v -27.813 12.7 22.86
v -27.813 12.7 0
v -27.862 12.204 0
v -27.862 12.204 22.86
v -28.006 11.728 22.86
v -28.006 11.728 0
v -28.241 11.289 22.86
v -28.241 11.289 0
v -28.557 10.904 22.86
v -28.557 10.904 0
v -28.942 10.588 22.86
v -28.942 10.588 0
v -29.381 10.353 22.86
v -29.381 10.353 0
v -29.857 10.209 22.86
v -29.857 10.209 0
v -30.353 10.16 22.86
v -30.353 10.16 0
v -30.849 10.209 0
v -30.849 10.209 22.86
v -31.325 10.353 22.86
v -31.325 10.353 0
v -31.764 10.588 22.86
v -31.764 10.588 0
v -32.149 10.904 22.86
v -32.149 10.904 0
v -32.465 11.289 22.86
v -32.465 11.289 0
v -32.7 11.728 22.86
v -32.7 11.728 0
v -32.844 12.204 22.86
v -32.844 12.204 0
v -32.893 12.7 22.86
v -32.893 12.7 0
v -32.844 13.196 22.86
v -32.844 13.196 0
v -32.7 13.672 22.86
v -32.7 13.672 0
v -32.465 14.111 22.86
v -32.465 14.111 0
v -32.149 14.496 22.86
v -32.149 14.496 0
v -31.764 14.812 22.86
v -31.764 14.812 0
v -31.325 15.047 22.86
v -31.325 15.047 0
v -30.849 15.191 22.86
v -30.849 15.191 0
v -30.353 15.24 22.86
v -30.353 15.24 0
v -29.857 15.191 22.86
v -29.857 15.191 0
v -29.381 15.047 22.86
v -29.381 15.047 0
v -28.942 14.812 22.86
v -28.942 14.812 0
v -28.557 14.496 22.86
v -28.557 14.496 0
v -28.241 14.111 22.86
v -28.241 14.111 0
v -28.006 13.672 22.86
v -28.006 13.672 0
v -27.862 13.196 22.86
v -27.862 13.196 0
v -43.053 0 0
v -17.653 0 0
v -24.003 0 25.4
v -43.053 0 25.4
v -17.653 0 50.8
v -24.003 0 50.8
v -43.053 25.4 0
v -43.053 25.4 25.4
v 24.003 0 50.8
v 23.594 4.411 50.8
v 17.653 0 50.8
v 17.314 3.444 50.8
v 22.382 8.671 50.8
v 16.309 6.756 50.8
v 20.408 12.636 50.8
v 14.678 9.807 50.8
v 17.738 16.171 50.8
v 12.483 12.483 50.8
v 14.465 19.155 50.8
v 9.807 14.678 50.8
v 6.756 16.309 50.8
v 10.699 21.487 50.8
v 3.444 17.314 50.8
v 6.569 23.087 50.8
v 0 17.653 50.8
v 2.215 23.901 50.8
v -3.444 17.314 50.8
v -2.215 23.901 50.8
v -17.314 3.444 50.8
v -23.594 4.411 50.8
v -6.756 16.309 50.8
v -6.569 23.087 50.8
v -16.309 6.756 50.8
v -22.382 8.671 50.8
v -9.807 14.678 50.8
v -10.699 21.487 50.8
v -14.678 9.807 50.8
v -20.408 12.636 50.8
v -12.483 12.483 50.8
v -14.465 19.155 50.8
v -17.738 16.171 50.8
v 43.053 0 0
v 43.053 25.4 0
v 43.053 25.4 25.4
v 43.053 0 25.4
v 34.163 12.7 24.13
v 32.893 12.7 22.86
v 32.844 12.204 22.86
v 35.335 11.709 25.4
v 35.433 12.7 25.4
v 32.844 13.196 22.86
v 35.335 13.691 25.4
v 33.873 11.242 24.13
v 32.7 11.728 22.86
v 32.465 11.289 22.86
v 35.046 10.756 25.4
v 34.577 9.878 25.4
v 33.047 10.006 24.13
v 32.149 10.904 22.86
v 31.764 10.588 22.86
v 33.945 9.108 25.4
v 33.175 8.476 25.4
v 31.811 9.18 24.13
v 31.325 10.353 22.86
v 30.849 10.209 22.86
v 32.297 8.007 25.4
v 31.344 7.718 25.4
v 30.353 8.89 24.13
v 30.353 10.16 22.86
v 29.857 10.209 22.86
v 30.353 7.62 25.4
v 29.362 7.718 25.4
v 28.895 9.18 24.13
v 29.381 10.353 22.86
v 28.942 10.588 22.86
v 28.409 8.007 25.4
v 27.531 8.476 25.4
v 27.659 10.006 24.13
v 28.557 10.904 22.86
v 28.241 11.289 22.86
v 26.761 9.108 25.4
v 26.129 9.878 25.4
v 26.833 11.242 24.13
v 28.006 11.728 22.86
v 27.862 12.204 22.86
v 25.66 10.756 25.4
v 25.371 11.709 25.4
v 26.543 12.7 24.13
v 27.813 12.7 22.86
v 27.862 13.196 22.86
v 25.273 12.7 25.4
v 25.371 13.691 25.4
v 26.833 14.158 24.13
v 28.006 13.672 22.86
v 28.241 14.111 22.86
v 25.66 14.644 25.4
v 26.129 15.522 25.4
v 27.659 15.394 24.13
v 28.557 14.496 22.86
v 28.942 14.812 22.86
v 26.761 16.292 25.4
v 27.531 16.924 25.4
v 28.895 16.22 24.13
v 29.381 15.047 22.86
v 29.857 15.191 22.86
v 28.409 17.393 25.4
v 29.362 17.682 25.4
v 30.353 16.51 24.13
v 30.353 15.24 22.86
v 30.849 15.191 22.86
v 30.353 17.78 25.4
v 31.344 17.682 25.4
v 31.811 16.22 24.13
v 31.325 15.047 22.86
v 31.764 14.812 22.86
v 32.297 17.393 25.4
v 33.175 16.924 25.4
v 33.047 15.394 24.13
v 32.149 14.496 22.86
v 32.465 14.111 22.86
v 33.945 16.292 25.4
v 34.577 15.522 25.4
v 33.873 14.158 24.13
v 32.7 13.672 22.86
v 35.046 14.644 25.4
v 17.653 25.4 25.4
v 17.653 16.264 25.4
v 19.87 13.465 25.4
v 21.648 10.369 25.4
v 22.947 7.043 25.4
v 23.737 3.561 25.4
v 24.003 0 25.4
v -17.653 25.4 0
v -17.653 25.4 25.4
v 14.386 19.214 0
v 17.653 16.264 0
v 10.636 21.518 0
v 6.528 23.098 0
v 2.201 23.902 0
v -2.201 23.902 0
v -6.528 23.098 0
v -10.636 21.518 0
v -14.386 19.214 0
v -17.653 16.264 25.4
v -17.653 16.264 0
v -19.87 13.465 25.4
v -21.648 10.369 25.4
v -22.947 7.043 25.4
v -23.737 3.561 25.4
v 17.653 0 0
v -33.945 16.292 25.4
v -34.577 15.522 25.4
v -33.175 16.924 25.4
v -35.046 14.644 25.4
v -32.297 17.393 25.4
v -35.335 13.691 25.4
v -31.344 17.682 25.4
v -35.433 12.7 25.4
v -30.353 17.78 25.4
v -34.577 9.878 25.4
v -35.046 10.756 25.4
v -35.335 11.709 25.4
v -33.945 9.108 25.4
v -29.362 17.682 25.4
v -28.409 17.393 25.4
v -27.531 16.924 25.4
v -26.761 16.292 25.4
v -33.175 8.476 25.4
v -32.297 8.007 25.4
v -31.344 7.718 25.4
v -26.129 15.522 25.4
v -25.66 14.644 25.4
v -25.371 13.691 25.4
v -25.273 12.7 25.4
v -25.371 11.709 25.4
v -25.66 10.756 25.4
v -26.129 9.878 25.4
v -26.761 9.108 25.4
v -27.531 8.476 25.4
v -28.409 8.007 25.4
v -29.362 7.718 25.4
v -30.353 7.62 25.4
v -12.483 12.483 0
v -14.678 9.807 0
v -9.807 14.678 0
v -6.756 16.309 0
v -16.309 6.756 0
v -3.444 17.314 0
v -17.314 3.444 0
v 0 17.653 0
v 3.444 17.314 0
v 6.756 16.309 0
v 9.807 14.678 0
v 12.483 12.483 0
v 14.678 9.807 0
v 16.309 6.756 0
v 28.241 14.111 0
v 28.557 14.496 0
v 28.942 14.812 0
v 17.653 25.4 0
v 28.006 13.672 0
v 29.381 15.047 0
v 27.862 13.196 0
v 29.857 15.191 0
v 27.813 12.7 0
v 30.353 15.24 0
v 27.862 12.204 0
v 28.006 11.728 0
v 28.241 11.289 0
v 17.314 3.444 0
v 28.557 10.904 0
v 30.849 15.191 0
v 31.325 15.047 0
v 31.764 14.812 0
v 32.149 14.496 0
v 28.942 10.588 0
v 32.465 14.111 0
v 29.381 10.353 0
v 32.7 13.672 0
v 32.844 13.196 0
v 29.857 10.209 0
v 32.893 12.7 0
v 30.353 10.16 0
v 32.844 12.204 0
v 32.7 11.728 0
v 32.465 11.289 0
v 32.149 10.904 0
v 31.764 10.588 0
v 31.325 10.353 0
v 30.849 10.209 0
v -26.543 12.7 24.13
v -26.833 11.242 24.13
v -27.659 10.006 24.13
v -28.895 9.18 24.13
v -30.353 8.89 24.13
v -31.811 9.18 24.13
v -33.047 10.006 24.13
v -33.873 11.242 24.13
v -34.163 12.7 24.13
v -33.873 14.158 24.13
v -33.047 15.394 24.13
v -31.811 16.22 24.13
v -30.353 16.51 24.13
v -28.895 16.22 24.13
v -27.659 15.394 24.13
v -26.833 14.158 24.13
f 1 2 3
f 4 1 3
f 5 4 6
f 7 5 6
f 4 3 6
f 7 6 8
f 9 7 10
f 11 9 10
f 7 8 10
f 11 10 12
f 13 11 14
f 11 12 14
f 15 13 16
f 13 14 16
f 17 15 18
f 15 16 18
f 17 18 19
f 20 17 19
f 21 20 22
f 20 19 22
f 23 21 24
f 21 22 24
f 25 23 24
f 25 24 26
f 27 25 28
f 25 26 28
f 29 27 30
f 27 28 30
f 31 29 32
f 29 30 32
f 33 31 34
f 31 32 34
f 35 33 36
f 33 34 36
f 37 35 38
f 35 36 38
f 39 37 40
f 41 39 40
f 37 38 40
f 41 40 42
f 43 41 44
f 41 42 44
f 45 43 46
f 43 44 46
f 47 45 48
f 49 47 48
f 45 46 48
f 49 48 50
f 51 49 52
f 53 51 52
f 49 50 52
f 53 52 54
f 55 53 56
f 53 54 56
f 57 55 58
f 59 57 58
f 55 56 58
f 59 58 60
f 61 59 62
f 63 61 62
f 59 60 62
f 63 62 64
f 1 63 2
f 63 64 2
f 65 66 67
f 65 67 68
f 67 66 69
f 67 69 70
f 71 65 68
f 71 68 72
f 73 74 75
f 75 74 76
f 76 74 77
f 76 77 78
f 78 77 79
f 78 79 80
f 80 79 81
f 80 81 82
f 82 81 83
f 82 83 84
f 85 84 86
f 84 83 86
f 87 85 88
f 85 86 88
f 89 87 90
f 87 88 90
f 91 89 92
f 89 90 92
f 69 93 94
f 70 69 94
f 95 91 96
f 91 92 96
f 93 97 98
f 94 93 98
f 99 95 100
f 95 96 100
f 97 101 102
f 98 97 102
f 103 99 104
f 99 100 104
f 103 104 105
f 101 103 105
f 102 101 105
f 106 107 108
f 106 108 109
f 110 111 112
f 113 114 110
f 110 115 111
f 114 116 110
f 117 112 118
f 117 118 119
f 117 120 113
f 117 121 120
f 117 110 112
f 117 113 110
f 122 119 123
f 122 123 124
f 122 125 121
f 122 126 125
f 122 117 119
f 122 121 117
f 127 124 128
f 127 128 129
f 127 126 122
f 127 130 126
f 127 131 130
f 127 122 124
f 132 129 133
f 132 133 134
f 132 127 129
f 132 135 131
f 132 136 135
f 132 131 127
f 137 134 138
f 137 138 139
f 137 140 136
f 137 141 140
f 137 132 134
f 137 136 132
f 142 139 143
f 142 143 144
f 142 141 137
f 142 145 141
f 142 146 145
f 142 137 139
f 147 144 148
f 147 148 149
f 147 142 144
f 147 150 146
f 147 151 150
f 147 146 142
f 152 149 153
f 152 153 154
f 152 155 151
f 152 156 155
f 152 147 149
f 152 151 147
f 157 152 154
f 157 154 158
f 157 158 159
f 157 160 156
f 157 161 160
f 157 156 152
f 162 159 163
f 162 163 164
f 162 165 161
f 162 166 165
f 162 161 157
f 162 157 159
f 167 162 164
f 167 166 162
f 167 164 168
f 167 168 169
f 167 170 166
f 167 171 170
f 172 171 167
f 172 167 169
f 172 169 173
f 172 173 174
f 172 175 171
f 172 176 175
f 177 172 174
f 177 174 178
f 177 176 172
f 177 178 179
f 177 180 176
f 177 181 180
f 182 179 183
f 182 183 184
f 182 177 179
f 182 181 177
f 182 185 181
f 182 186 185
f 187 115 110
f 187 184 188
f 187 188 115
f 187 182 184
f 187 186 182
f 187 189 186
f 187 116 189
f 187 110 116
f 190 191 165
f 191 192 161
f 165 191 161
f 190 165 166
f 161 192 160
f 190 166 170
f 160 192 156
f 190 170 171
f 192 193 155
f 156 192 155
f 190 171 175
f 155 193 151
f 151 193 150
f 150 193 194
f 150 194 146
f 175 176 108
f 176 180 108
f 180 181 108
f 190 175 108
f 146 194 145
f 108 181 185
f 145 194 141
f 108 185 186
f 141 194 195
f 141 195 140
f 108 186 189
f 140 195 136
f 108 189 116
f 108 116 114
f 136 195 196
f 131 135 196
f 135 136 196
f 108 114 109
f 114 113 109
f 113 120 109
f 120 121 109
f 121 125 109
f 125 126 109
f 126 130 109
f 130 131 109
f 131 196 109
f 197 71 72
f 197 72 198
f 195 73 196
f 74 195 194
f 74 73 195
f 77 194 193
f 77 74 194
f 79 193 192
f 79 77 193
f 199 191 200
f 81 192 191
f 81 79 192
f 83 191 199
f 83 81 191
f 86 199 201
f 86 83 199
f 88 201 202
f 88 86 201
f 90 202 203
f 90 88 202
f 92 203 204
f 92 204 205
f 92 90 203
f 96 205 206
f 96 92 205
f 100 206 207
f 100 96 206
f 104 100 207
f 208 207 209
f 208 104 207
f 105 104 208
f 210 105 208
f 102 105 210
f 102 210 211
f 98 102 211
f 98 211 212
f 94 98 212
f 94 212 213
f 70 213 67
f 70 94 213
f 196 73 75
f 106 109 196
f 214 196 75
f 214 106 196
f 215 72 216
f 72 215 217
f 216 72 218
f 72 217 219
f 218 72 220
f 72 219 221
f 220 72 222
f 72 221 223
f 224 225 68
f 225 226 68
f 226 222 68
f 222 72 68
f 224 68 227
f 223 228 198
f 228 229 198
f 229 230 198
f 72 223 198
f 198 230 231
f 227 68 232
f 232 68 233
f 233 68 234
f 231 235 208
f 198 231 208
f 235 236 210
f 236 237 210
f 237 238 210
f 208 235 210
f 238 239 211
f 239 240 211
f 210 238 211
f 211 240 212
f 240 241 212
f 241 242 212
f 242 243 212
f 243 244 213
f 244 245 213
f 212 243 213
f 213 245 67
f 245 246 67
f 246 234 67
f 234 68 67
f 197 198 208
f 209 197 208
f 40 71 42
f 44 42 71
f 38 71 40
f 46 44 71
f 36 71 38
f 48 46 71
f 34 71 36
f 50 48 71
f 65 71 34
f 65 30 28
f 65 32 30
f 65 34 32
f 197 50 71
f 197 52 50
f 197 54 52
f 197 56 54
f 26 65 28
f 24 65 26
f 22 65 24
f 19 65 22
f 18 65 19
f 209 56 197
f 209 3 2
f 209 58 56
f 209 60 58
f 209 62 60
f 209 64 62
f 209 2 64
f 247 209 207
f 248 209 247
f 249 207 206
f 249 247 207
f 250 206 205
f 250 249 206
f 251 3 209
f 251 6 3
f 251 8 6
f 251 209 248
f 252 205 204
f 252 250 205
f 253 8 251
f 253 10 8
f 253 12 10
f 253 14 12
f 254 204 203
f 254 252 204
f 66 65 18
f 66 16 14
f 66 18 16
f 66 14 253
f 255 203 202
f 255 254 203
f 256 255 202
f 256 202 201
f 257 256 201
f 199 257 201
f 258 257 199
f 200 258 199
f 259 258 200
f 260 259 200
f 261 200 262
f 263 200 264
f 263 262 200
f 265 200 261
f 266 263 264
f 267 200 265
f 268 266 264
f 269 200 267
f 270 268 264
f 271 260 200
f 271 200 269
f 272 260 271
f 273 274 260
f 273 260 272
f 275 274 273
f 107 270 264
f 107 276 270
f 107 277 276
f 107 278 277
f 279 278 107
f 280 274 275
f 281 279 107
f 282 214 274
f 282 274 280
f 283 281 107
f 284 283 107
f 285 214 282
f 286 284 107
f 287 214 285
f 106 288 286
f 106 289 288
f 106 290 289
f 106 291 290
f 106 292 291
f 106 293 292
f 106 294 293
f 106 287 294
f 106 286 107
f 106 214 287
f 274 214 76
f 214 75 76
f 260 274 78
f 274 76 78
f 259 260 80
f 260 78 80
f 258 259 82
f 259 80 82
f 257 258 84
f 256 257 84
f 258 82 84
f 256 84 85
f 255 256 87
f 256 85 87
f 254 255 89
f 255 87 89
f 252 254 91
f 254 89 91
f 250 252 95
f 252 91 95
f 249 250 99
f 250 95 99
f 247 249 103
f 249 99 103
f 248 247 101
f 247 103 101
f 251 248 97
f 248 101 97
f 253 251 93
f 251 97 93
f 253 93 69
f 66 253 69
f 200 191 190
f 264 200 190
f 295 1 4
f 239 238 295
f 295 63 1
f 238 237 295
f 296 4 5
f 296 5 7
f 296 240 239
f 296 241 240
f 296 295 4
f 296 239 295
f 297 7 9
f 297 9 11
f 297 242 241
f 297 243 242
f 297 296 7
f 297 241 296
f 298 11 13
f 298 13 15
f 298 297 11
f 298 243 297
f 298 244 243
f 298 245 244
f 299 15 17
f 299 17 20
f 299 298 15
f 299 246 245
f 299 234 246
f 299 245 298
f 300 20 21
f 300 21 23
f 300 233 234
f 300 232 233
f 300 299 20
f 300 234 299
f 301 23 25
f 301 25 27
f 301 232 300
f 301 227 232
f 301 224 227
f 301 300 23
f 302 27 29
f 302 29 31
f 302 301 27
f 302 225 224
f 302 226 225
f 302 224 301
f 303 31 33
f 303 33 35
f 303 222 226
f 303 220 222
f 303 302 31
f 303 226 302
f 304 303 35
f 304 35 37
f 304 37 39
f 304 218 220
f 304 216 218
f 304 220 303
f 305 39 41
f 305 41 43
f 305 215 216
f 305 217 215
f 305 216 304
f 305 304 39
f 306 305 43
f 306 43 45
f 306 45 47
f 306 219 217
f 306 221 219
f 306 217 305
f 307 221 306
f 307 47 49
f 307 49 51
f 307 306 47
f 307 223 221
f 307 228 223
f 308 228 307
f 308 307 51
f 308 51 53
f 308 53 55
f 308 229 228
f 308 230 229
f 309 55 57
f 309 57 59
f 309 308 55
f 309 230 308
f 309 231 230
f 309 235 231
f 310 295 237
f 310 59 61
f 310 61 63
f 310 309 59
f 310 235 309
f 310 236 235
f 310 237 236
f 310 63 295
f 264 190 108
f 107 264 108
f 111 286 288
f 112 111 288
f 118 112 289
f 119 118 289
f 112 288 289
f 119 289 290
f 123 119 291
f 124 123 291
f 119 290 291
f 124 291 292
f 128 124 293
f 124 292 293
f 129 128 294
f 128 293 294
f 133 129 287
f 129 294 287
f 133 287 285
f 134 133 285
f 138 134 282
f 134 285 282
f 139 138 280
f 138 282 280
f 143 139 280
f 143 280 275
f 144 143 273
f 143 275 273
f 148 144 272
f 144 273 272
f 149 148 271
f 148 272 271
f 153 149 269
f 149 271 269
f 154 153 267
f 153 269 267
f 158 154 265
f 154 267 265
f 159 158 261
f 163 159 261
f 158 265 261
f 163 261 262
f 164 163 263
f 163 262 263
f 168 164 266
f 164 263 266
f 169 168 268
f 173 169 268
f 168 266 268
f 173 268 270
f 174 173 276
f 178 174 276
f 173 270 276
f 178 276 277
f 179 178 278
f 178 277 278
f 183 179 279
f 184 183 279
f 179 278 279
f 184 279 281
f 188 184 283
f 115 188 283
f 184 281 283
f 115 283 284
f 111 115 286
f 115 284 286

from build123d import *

# Parameters (mm, degrees)
F0_W     = 6.35
F0_H     = 50.8
F1_ANGLE = 180
F2_R     = 2.54
F3_DEPTH = 25.4
F4_SIZE  = 2.54


with BuildPart() as f1:
    # F0 (on Front) → F1 (revolve)
    with BuildSketch(Plane.XZ):
        with Locations((20.828, 25.4)):
            Rectangle(F0_W, F0_H)
    revolve(axis=Axis((0, 0, 25.4), (0, 0, 1)), revolution_arc=F1_ANGLE)

    # F2 (on face) → F3 (join)
    with BuildSketch(Plane(origin=(0, 0, 0), x_dir=(1, 0, 0), z_dir=(0, 0, -1))):
        with BuildLine():
            Line((43.053, 0), (24.003, 0))
            ThreePointArc((24.003, 0), (22.359215, -8.729807), (17.653, -16.263936))
            Line((17.653, -16.263936), (17.653, -25.4))
            Line((17.653, -25.4), (43.053, -25.4))
            Line((43.053, -25.4), (43.053, 0))
        make_face()
        with Locations((30.353, -12.7)):
            Circle(F2_R, mode=Mode.SUBTRACT)
        with BuildLine():
            Line((-17.653, -25.4), (-17.653, -16.263936))
            ThreePointArc((-17.653, -16.263936), (-22.359215, -8.729807), (-24.003, 0))
            Line((-24.003, 0), (-43.053, 0))
            Line((-43.053, 0), (-43.053, -25.4))
            Line((-43.053, -25.4), (-17.653, -25.4))
        make_face()
        with Locations((-30.353, -12.7)):
            Circle(F2_R, mode=Mode.SUBTRACT)
    extrude(amount=-F3_DEPTH)

    # F4
    f4_edges = [f1.edges().sort_by_distance(p)[0] for p in [
        (-32.893, 12.7, 25.4),
        (27.813, 12.7, 25.4),
    ]]
    chamfer(f4_edges, length=F4_SIZE)


solid = f1.part
